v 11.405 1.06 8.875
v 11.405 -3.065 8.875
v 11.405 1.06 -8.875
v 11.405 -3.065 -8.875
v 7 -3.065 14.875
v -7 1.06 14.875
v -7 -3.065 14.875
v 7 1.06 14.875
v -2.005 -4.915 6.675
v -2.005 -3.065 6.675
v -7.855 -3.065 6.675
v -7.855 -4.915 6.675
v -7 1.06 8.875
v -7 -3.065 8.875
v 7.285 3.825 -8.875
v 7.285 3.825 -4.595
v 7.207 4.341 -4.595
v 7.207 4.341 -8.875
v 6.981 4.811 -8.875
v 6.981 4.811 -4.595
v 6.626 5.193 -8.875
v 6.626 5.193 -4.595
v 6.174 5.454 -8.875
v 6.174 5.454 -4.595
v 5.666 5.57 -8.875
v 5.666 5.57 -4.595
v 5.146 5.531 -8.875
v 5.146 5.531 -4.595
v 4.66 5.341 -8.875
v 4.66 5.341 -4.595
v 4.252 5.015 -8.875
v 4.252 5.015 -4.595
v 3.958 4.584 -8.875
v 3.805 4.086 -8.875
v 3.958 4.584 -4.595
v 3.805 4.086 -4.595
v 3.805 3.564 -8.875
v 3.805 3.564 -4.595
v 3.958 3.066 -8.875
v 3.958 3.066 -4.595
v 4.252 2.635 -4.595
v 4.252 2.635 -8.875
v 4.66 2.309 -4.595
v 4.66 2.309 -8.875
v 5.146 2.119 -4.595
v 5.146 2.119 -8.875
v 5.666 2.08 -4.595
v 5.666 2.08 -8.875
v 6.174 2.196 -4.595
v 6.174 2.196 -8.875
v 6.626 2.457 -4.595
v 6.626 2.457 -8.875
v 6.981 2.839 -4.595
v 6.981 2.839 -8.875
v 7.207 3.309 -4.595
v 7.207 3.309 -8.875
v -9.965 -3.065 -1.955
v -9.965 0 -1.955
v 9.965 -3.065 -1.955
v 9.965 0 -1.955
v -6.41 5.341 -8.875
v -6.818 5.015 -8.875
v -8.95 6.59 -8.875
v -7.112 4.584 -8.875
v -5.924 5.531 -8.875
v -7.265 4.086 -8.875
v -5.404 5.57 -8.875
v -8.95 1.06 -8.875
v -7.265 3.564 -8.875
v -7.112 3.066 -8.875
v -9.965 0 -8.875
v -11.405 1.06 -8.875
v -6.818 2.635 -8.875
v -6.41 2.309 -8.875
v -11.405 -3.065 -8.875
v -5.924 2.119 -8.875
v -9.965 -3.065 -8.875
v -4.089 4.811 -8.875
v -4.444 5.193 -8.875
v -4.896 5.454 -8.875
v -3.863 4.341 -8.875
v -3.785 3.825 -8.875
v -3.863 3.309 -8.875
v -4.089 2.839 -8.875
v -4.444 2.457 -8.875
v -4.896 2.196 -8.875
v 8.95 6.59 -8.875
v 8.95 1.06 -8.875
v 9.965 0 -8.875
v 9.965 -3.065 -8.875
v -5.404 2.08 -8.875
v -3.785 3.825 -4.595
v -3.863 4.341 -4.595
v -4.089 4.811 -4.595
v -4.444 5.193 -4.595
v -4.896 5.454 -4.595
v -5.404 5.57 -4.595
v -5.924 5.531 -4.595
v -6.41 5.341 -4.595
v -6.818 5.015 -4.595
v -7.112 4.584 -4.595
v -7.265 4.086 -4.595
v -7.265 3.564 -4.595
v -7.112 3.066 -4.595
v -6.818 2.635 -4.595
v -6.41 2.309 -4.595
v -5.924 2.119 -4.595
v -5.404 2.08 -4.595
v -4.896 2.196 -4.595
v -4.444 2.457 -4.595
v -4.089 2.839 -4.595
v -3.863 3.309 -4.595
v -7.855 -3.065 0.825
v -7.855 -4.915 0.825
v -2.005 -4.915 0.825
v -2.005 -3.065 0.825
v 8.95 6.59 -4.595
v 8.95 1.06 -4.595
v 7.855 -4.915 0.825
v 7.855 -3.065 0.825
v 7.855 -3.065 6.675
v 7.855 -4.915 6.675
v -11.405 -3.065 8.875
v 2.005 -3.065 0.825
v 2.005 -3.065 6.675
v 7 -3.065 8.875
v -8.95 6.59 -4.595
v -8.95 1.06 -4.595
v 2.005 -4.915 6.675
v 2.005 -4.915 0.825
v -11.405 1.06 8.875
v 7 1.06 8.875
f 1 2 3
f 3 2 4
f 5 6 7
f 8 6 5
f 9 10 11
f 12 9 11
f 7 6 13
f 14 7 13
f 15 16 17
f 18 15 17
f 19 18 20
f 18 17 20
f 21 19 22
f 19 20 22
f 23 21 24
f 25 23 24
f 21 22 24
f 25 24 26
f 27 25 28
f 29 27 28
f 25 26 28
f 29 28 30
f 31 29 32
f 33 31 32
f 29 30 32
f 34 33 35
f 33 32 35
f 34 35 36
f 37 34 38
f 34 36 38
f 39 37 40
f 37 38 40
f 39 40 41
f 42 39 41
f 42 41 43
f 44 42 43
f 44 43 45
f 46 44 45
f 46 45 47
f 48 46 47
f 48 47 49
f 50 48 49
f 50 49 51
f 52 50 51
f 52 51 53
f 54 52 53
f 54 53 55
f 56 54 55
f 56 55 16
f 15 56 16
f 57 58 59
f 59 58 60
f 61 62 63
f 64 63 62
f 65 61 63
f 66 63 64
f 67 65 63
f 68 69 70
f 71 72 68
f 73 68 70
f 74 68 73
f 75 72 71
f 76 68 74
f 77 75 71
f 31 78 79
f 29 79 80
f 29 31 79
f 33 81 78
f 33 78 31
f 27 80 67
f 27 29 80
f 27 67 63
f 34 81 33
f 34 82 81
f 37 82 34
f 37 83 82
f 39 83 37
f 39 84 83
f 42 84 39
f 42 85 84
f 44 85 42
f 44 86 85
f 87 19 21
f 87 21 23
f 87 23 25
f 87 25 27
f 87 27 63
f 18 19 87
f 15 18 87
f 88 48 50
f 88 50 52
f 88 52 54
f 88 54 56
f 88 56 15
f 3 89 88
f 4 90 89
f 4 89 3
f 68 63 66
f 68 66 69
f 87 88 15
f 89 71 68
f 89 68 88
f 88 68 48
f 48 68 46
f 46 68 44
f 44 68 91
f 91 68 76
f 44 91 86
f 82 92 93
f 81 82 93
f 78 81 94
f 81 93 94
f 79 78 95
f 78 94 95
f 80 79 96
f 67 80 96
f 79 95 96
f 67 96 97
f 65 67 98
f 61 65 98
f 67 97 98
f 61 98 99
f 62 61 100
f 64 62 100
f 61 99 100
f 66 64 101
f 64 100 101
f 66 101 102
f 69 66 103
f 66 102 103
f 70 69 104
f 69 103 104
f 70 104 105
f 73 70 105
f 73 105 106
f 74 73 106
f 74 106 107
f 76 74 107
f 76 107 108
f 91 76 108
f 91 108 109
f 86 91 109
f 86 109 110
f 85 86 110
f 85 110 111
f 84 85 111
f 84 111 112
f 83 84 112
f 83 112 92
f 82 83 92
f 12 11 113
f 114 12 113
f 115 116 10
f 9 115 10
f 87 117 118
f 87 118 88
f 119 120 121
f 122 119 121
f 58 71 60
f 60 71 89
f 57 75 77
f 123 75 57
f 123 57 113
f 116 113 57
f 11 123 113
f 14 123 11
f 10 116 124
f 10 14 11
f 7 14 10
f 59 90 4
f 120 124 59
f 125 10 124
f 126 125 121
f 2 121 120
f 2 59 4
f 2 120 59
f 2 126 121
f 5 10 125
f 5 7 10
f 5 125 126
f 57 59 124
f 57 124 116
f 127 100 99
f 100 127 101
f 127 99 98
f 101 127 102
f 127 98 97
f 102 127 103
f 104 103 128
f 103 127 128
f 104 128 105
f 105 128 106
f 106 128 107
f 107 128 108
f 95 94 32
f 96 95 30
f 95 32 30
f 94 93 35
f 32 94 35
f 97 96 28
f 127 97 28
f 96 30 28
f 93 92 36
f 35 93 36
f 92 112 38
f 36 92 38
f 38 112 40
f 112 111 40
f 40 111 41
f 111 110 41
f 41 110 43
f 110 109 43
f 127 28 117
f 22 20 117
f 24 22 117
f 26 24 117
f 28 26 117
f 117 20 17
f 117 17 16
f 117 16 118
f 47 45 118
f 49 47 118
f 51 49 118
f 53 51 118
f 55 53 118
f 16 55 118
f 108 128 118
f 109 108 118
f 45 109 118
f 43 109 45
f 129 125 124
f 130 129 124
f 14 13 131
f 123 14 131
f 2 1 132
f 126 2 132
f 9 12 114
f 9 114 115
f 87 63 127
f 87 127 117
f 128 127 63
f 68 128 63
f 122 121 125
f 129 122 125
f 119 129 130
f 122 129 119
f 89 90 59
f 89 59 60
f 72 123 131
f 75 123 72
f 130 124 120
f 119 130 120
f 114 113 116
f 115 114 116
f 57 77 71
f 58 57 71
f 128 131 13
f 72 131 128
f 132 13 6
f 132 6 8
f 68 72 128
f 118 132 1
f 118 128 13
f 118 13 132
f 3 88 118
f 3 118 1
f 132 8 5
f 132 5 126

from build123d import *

# Parameters (mm, degrees)
SKETCH_1_W          = 22.81
SKETCH_1_H          = 17.75
EXTRUDE_1_DEPTH     = 1.06
SKETCH_2_W          = 1.44
SKETCH_2_H          = 3.065036756
EXTRUDE_2_DEPTH     = 6.92
EXTRUDE_3_DEPTH     = 3.065036756
SKETCH_4_R          = 2.925
EXTRUDE_4_DEPTH     = 5.85
SKETCH_5_W          = 22.81
SKETCH_5_H          = 4.28
EXTRUDE_5_DEPTH     = 5.53
SKETCH_6_R          = 1.75
CUT_EXTRUDE_1_DEPTH = 5.53
SKETCH_7_W          = 14
SKETCH_7_H          = 6
EXTRUDE_6_DEPTH     = 4.125036756
CUT_EXTRUDE_START   = -4
SKETCH_8_R          = 2.925
CUT_EXTRUDE_2_DEPTH = 4
EXTRUDE_START       = -1.85
EXTRUDE_7_DEPTH     = 1.85
SKETCH_10_W         = 2.455
SKETCH_10_H         = 4.28
CUT_EXTRUDE_3_DEPTH = 5.53


with BuildPart() as part:
    # 草图1 → 凸台-拉伸1 (new body)
    with BuildSketch(Plane(origin=(0, 0, 0), x_dir=(1, 0, 0), z_dir=(0, 1, 0))):
        Rectangle(SKETCH_1_W, SKETCH_1_H)
    extrude(amount=EXTRUDE_1_DEPTH)

    # 草图2 → 凸台-拉伸2 (add)
    with BuildSketch(Plane(origin=(0, 0, -8.875), x_dir=(-1, 0, 0), z_dir=(0, 0, -1))):
        with Locations((-10.685, -1.532518378)):
            Rectangle(SKETCH_2_W, SKETCH_2_H)
        with Locations((10.685, -1.532518378)):
            Rectangle(SKETCH_2_W, SKETCH_2_H)
    extrude(amount=-EXTRUDE_2_DEPTH)

    # 草图3 → 凸台-拉伸3 (add)
    with BuildSketch(Plane.XZ):
        Polygon((-11.405, 8.875), (-11.405, -1.955), (-9.965, -1.955), (9.965, -1.955), (11.405, -1.955), (11.405, 8.875), align=None)
    extrude(amount=EXTRUDE_3_DEPTH)

    # 草图4 → 凸台-拉伸4 (add)
    with BuildSketch(Plane.XZ.offset(3.065036756)):
        with Locations(Location((-4.93, 3.75, 0), (0, 0, 270))):
            Circle(SKETCH_4_R)
        with Locations(Location((4.93, 3.75, 0), (0, 0, 270))):
            Circle(SKETCH_4_R)
    extrude(amount=EXTRUDE_4_DEPTH)

    # 草图5 → 凸台-拉伸5 (add)
    with BuildSketch(Plane(origin=(0, 1.06, 0), x_dir=(1, 0, 0), z_dir=(0, 1, 0))):
        with Locations((0, 6.735)):
            Rectangle(SKETCH_5_W, SKETCH_5_H)
    extrude(amount=EXTRUDE_5_DEPTH)

    # 草图6 → 切除-拉伸1 (cut)
    with BuildSketch(Plane.XY.offset(-4.595)):
        with Locations((5.535, 3.825)):
            Circle(SKETCH_6_R)
        with Locations((-5.535, 3.825)):
            Circle(SKETCH_6_R)
    extrude(amount=-CUT_EXTRUDE_1_DEPTH, mode=Mode.SUBTRACT)

    # 草图7 → 凸台-拉伸6 (add)
    with BuildSketch(Plane(origin=(0, 1.06, 0), x_dir=(1, 0, 0), z_dir=(0, 1, 0))):
        with Locations((0, -11.875)):
            Rectangle(SKETCH_7_W, SKETCH_7_H)
    extrude(amount=-EXTRUDE_6_DEPTH)

    # 草图8 → 切除-拉伸2 (cut)
    with BuildSketch(Plane.XZ.offset(8.915036756).offset(CUT_EXTRUDE_START)):
        with Locations(Location((-4.93, 3.75, 0), (0, 0, 270))):
            Circle(SKETCH_8_R)
        with Locations(Location((4.93, 3.75, 0), (0, 0, 270))):
            Circle(SKETCH_8_R)
    extrude(amount=CUT_EXTRUDE_2_DEPTH, mode=Mode.SUBTRACT)

    # 草图9 → 凸台-拉伸7 (add)
    with BuildSketch(Plane.XZ.offset(4.915036756).offset(EXTRUDE_START)):
        with BuildLine():
            ThreePointArc((-7.855, 3.75), (-6.998287335, 5.818287335), (-4.93, 6.675))
            Line((-4.93, 6.675), (-7.855, 6.675))
            Line((-7.855, 6.675), (-7.855, 3.75))
        make_face()
        with BuildLine():
            Line((-7.855, 0.825), (-4.93, 0.825))
            ThreePointArc((-4.93, 0.825), (-6.998287335, 1.681712665), (-7.855, 3.75))
            Line((-7.855, 3.75), (-7.855, 0.825))
        make_face()
        with BuildLine():
            Line((-2.005, 0.825), (-2.005, 3.75))
            ThreePointArc((-2.005, 3.75), (-2.861712665, 1.681712665), (-4.93, 0.825))
            Line((-4.93, 0.825), (-2.005, 0.825))
        make_face()
        with BuildLine():
            ThreePointArc((-4.93, 6.675), (-2.861712665, 5.818287335), (-2.005, 3.75))
            Line((-2.005, 3.75), (-2.005, 6.675))
            Line((-2.005, 6.675), (-4.93, 6.675))
        make_face()
        with BuildLine():
            ThreePointArc((2.005, 3.75), (2.861712665, 5.818287335), (4.93, 6.675))
            Line((4.93, 6.675), (2.005, 6.675))
            Line((2.005, 6.675), (2.005, 3.75))
        make_face()
        with BuildLine():
            ThreePointArc((4.93, 0.825), (2.861712665, 1.681712665), (2.005, 3.75))
            Line((2.005, 3.75), (2.005, 0.825))
            Line((2.005, 0.825), (4.93, 0.825))
        make_face()
        with BuildLine():
            Line((7.855, 0.825), (7.855, 3.75))
            ThreePointArc((7.855, 3.75), (6.998287335, 1.681712665), (4.93, 0.825))
            Line((4.93, 0.825), (7.855, 0.825))
        make_face()
        with BuildLine():
            Line((7.855, 6.675), (4.93, 6.675))
            ThreePointArc((4.93, 6.675), (6.998287335, 5.818287335), (7.855, 3.75))
            Line((7.855, 3.75), (7.855, 6.675))
        make_face()
    extrude(amount=EXTRUDE_7_DEPTH)

    # 草图10 → 切除-拉伸3 (cut)
    with BuildSketch(Plane(origin=(0, 6.59, 0), x_dir=(1, 0, 0), z_dir=(0, 1, 0))):
        with Locations((-10.1775, 6.735)):
            Rectangle(SKETCH_10_W, SKETCH_10_H)
        with Locations((10.1775, 6.735)):
            Rectangle(SKETCH_10_W, SKETCH_10_H)
    extrude(amount=-CUT_EXTRUDE_3_DEPTH, mode=Mode.SUBTRACT)


solid = part.part
